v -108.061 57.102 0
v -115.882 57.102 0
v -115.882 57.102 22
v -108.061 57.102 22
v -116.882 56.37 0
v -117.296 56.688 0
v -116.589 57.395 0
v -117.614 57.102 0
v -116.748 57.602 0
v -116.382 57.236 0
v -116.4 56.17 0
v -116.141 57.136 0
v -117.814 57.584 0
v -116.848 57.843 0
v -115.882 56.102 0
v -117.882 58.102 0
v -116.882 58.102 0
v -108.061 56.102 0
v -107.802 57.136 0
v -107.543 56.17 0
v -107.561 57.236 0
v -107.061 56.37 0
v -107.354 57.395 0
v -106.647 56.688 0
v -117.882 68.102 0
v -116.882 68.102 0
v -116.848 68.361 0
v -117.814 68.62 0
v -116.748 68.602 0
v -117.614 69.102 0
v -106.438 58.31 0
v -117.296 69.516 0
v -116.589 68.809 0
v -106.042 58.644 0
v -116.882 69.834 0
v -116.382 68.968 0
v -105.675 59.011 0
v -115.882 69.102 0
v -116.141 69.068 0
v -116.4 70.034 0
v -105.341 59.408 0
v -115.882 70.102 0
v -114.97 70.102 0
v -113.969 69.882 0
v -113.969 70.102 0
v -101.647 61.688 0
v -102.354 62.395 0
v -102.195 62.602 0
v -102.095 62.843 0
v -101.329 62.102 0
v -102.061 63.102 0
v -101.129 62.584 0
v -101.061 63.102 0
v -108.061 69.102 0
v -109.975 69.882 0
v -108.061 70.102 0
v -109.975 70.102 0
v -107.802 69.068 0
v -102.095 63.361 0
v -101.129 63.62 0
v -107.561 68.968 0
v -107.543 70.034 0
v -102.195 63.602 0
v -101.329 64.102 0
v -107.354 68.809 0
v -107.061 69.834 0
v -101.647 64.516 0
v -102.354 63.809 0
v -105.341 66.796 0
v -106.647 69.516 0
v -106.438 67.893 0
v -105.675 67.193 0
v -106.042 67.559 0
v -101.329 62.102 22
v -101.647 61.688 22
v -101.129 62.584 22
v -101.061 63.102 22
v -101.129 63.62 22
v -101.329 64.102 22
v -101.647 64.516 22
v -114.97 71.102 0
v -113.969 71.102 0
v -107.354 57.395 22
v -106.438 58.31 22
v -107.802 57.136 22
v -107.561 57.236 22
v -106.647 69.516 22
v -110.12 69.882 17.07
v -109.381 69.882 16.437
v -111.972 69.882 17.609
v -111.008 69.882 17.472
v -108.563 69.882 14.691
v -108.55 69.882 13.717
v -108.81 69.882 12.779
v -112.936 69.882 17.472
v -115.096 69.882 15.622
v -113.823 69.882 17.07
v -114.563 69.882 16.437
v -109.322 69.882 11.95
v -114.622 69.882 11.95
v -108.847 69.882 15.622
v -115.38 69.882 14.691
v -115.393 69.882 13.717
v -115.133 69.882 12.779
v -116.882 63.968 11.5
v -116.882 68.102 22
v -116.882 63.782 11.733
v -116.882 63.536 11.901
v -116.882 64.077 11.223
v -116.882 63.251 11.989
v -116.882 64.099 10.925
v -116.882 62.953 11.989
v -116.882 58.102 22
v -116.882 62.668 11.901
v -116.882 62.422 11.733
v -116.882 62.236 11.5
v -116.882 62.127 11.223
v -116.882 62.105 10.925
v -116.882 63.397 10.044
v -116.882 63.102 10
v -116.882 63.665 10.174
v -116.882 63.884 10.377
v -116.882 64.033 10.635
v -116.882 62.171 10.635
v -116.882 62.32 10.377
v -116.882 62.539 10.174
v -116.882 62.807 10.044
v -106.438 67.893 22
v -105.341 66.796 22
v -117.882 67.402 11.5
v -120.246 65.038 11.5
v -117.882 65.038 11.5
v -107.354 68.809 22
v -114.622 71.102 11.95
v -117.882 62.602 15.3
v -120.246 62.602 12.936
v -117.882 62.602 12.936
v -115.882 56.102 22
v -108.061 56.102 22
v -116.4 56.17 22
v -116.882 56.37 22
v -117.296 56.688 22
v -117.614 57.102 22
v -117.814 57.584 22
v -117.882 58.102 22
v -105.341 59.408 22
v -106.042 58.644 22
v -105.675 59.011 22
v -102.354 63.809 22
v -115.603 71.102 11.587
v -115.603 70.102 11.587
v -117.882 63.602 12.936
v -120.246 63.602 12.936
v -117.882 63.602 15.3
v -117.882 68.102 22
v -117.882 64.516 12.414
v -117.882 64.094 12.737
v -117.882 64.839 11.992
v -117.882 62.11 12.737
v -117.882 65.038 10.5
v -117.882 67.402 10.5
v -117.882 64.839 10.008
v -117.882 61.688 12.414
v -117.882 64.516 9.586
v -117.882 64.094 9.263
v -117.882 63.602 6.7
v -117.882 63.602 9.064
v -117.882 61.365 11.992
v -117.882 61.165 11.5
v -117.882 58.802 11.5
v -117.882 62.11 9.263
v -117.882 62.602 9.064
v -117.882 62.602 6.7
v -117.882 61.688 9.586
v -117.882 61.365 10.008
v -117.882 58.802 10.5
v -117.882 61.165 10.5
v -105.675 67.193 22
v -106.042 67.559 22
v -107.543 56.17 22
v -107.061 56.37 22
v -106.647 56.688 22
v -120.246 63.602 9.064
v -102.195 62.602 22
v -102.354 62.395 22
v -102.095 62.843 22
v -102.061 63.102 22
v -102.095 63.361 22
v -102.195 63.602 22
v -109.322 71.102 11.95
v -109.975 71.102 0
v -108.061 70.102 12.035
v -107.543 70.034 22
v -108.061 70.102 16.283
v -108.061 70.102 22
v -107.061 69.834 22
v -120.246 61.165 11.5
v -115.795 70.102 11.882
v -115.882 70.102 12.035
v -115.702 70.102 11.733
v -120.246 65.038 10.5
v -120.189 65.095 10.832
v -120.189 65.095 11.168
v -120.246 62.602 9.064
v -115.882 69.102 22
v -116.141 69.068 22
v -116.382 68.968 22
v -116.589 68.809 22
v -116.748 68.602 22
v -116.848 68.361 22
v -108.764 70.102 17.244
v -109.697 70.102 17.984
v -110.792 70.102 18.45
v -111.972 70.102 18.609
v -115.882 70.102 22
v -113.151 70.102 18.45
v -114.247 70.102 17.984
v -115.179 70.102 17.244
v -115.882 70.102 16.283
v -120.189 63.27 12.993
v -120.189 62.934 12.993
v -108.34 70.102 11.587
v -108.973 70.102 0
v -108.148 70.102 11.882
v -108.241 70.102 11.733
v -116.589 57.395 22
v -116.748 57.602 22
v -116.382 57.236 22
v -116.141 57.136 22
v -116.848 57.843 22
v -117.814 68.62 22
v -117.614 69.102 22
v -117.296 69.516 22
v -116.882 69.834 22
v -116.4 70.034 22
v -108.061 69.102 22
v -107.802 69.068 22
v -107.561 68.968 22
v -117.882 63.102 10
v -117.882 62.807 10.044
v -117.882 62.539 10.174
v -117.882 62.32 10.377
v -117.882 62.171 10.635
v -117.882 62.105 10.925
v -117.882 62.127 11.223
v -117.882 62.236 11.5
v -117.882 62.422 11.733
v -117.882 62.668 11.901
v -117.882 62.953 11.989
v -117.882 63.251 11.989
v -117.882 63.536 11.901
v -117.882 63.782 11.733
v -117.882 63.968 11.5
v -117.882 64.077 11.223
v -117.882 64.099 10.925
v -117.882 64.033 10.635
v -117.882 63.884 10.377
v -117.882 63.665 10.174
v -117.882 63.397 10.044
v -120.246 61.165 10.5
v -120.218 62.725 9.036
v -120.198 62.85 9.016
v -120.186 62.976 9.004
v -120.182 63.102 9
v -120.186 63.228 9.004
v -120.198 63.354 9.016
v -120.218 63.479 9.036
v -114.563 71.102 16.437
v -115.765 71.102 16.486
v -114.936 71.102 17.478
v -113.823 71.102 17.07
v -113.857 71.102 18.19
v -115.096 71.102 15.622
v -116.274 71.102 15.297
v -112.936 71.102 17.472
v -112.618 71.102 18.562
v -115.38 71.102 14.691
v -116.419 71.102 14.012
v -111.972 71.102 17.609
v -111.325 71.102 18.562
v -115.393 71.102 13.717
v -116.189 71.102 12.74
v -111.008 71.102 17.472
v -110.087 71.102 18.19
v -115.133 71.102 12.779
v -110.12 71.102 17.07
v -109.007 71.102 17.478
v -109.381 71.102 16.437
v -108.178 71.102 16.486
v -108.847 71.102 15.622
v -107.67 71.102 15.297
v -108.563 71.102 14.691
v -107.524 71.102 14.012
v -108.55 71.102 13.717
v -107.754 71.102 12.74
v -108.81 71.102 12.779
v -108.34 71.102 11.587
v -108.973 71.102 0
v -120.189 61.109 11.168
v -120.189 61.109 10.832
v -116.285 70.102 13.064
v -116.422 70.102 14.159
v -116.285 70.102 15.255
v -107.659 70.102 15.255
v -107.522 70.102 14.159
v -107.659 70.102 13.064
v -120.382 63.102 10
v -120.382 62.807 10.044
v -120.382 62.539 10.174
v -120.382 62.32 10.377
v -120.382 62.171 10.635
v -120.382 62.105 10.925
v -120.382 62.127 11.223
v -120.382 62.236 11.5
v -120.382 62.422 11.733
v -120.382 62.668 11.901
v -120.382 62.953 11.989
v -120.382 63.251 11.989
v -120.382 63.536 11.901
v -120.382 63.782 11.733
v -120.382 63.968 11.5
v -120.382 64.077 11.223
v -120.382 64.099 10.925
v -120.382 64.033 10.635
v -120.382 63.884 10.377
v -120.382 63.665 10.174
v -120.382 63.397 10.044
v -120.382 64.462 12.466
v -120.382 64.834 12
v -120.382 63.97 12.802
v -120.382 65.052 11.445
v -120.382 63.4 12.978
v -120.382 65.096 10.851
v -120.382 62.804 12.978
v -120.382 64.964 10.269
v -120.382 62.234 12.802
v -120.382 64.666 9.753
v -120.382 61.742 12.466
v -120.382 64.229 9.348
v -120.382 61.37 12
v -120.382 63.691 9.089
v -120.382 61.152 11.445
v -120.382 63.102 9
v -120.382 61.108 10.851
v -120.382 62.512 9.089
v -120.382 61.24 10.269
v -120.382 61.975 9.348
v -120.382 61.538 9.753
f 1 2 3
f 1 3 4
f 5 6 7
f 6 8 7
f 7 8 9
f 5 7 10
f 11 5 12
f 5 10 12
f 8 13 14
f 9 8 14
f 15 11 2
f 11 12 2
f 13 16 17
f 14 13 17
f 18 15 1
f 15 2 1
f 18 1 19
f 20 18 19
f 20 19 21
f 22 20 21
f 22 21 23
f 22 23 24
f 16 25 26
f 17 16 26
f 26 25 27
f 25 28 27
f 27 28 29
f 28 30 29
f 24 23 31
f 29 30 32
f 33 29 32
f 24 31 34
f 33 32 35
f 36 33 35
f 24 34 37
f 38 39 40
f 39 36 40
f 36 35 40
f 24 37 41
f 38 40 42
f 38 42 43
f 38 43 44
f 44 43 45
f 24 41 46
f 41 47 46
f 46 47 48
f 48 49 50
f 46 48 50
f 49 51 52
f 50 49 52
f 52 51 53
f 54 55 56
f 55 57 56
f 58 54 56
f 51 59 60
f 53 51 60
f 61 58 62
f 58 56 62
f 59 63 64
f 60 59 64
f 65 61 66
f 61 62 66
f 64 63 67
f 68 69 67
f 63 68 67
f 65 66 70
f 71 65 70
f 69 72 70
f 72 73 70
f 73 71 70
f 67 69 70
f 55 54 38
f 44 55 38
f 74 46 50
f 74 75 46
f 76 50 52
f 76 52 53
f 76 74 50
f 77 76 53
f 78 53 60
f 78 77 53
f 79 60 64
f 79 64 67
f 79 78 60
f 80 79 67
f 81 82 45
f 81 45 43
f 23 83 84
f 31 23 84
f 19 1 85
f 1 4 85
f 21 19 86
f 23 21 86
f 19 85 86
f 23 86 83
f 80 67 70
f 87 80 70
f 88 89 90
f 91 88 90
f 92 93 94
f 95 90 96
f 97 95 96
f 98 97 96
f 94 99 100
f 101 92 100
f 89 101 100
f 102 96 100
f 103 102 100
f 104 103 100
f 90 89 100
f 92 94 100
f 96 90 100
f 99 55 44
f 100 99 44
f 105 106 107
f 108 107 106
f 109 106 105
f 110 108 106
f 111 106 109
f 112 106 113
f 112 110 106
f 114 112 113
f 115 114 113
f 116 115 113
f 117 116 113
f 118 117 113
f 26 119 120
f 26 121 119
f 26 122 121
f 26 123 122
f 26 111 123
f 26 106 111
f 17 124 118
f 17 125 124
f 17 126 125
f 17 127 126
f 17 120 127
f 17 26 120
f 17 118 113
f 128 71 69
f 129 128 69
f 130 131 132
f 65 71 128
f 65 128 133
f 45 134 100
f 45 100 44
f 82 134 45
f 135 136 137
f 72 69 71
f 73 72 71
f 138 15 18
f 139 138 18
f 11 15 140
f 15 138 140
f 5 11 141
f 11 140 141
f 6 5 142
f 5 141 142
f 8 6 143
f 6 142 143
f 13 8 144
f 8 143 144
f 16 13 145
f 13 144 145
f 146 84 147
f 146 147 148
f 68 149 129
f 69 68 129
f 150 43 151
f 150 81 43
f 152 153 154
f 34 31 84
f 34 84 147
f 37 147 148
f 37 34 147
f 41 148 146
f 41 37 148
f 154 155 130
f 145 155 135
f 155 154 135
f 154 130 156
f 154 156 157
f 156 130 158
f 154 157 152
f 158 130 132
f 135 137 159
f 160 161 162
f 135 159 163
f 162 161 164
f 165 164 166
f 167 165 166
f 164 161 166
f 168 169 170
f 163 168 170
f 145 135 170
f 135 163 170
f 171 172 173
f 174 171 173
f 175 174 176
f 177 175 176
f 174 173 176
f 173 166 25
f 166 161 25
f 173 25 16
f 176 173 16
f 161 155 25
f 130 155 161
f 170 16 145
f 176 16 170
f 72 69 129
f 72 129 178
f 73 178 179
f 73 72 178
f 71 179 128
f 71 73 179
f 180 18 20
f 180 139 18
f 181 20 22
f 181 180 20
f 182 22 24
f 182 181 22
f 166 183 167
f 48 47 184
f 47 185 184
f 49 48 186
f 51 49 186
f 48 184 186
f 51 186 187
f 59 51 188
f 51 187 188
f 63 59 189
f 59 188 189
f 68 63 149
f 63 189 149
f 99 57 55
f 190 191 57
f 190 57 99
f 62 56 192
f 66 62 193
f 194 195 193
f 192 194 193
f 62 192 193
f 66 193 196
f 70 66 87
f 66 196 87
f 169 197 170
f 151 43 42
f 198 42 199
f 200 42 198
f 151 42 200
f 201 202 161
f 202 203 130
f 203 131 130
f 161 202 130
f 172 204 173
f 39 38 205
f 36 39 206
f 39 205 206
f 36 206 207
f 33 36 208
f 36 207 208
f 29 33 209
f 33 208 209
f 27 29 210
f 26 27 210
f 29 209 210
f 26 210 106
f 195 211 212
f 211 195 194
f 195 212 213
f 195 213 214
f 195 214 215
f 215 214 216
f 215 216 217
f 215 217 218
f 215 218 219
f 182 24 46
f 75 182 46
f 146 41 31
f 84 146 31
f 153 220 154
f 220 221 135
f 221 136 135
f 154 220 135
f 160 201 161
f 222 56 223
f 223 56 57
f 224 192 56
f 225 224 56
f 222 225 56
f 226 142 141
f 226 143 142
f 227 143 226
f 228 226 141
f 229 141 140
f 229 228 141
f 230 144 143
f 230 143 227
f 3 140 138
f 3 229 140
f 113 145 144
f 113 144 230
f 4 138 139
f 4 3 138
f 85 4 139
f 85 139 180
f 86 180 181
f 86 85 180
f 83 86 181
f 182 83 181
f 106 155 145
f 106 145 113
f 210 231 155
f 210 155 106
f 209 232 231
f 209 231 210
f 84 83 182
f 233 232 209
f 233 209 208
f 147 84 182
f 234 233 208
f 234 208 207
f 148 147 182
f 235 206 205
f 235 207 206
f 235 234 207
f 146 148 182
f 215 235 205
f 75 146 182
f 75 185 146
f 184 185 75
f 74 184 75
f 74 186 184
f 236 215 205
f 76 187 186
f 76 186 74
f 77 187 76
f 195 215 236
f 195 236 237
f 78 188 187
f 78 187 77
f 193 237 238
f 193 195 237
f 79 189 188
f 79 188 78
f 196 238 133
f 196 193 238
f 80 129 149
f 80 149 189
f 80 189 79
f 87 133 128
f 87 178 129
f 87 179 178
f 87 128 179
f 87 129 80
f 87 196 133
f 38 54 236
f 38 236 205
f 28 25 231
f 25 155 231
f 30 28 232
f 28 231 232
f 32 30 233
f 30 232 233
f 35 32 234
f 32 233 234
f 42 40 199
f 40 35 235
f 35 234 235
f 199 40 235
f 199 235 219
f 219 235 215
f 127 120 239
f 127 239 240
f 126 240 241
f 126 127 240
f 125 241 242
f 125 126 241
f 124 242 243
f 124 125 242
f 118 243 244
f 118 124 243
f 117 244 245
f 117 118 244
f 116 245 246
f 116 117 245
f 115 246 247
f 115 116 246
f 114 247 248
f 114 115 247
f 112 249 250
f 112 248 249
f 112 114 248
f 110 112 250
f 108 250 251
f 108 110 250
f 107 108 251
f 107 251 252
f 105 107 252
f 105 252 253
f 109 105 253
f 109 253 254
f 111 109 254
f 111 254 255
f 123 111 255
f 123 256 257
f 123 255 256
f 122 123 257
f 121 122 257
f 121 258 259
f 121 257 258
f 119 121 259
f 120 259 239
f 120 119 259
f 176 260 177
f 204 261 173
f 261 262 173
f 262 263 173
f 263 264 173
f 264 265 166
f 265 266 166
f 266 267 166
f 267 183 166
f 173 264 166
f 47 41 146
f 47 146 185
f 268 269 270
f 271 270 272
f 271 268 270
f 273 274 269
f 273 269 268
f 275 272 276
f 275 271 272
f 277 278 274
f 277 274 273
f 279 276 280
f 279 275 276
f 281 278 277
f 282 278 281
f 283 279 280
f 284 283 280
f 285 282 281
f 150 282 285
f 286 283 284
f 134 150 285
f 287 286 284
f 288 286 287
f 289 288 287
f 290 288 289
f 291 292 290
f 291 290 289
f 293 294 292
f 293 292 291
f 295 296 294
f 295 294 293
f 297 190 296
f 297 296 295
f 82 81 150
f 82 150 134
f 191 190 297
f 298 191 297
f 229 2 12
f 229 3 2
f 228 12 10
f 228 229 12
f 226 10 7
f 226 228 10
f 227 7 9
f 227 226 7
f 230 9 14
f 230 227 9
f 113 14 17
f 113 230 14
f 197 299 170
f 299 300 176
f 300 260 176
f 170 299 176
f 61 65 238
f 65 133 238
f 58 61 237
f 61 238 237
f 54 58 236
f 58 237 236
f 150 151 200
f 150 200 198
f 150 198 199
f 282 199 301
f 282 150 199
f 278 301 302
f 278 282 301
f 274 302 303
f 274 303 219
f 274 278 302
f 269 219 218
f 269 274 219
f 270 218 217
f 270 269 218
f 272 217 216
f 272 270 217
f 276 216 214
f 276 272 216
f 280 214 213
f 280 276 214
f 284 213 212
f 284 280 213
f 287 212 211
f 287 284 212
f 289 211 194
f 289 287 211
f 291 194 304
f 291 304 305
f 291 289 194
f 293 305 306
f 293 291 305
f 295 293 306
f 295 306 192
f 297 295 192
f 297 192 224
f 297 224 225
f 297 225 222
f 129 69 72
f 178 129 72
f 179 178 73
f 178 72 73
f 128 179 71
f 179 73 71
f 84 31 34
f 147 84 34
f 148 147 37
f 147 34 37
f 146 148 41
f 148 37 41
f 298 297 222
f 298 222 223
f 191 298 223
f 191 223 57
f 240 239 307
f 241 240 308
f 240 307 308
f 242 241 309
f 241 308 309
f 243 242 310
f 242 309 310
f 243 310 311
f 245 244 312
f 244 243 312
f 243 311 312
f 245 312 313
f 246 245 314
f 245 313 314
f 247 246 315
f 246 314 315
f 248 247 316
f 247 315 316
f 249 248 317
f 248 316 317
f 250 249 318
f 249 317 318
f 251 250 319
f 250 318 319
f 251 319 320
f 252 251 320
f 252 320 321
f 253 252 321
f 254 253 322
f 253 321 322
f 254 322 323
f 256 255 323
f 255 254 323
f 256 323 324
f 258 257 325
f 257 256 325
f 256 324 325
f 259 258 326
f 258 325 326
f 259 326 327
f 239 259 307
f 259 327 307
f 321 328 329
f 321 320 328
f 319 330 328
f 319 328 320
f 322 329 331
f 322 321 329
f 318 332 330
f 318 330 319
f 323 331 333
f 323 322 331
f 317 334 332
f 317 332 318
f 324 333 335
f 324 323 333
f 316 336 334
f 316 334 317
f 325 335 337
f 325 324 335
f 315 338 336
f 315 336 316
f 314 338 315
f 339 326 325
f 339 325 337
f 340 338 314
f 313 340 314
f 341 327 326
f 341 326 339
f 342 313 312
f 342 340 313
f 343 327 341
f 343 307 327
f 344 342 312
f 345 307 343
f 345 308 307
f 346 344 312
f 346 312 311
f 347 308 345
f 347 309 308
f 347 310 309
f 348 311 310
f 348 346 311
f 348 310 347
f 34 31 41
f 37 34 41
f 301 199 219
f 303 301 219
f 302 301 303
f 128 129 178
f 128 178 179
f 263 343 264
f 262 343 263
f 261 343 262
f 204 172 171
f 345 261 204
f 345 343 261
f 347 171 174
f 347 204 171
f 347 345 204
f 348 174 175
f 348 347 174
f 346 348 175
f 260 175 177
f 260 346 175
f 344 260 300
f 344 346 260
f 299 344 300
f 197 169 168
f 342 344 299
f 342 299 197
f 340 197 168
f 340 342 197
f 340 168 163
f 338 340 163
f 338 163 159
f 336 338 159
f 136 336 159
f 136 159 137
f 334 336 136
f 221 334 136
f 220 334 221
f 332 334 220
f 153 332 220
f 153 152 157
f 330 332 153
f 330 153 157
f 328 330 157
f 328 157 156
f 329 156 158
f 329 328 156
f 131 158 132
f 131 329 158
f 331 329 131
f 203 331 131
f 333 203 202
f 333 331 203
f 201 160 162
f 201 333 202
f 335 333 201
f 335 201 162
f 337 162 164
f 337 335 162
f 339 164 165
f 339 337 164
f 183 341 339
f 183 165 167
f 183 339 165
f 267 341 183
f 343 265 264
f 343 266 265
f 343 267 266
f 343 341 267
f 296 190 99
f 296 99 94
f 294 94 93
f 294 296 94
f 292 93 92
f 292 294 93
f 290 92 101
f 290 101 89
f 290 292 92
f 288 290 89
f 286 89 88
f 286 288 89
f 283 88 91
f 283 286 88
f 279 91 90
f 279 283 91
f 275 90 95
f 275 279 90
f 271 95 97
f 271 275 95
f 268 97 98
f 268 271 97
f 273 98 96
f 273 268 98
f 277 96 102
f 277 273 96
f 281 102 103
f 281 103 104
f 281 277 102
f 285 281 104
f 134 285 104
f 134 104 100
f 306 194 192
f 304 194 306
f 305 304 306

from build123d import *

# Parameters (mm, degrees)
BOSS_EXTRU_1_DEPTH           = 22
CONG_1_R                     = 1
CONG_2_R                     = 2
ENL_V_MAT_EXTRU_2_DEPTH      = 3
ENL_V_MAT_EXTRU_2_DEPTH_BACK = 2
ESQUISSE3_R                  = 1
ENL_V_MAT_EXTRU_5_DEPTH      = 0.22
BOSS_EXTRU_3_START           = 2.5
ESQUISSE8_R                  = 2
ESQUISSE8_R_2                = 1
BOSS_EXTRU_3_DEPTH           = 2.5
NERVURE2_REACH               = 124.576
ESQUISSE13_WALL_W            = 250.687529102
ESQUISSE13_WALL_H            = 1
R_P_TITION_CIRCULAIRE1_COUNT = 4
BOSS_EXTRU_6_START           = 1
BOSS_EXTRU_6_DEPTH           = 1
FRACTIONNER1_DEPTH           = 22
FRACTIONNER1_2_DEPTH         = 22
FRACTIONNER1_3_DEPTH         = 22


# Read off the part's stored shape, not the designer's step: Fractionner1
with BuildPart() as part:
    # Esquisse1 → Boss.-Extru.1 (new body)
    with BuildSketch(Plane.XY):
        Polygon((-117.882204612, 56.101961411), (-107.232709675, 56.101961411), (-100.232709675, 63.101961411), (-107.232709675, 70.101961411), (-117.882204612, 70.101961411), align=None)
        Polygon((-116.882204612, 57.101961411), (-107.646923238, 57.101961411), (-101.646923238, 63.101961411), (-107.646923238, 69.101961411), (-116.882204612, 69.101961411), align=None, mode=Mode.SUBTRACT)
    extrude(amount=BOSS_EXTRU_1_DEPTH)

    # Congé1
    cong_1_edges = [part.edges().sort_by_distance(p)[0] for p in [
        (-116.882204612, 69.101961411, 11),
        (-116.882204612, 57.101961411, 11),
        (-107.646923238, 57.101961411, 11),
        (-101.646923238, 63.101961411, 11),
        (-107.646923238, 69.101961411, 11),
    ]]
    fillet(cong_1_edges, radius=CONG_1_R)

    # Congé2
    cong_2_edges = [part.edges().sort_by_distance(p)[0] for p in [
        (-117.882204612, 70.101961411, 11),
        (-107.232709675, 70.101961411, 11),
        (-100.232709675, 63.101961411, 11),
        (-107.232709675, 56.101961411, 11),
        (-117.882204612, 56.101961411, 11),
    ]]
    fillet(cong_2_edges, radius=CONG_2_R)

    # Esquisse3 → Enlèv. mat.-Extru.2 (cut, two sides: drawn at the far end of the back side and taken through both)
    with BuildSketch(Plane.ZY.offset(117.882204612).offset(-ENL_V_MAT_EXTRU_2_DEPTH_BACK)):
        with Locations(Location((11, 63.101961411, 0), (0, 0, 180))):
            Circle(ESQUISSE3_R)
    extrude(amount=ENL_V_MAT_EXTRU_2_DEPTH + ENL_V_MAT_EXTRU_2_DEPTH_BACK, mode=Mode.SUBTRACT)

    # Esquisse6 → Enlèv. mat.-Extru.5 (cut)
    with BuildSketch(Plane(origin=(0, 70.101961411, 0), x_dir=(1, 0, 0), z_dir=(0, 1, 0))):
        with BuildLine():
            Line((-109.974649826, 0), (-109.321670706, -11.950049764))
            ThreePointArc((-109.321670706, -11.950049764), (-111.971670706, -17.609121967), (-114.621670706, -11.950049764))
            Line((-114.621670706, -11.950049764), (-113.968691586, 0))
            Line((-113.968691586, 0), (-109.974649826, 0))
        make_face()
    extrude(amount=-ENL_V_MAT_EXTRU_5_DEPTH, mode=Mode.SUBTRACT)

    # Esquisse8 → Boss.-Extru.3 (add)
    with BuildSketch(Plane.ZY.offset(117.882204612).offset(BOSS_EXTRU_3_START)):
        with Locations(Location((11, 63.101961411, 0), (0, 0, 180))):
            Circle(ESQUISSE8_R)
        with Locations(Location((11, 63.101961411, 0), (0, 0, 180))):
            Circle(ESQUISSE8_R_2, mode=Mode.SUBTRACT)
    extrude(amount=-BOSS_EXTRU_3_DEPTH)

    # Esquisse13 wall → Nervure2 (add, up to next)
    with BuildSketch(Plane(origin=(-119.132204612, 63.101961411, 14.05), x_dir=(0.707106781187, 0, 0.707106781187), z_dir=(0.707106781187, 0, -0.707106781187)), mode=Mode.PRIVATE) as nervure2_sk1:
        Rectangle(ESQUISSE13_WALL_W, ESQUISSE13_WALL_H)
    nervure2_tool1 = extrude(nervure2_sk1.sketch, amount=NERVURE2_REACH, mode=Mode.PRIVATE) - part.part
    nervure2 = nervure2_tool1.solids().sort_by_distance((-119.132204612, 63.101961411, 14.05))[0]
    add(nervure2)

    # Répétition circulaire1: Nervure2 ×4 about axis
    r_p_tition_circulaire1_axis = Axis((0, 63.101961411, 11), (1, 0, 0))
    for i in range(1, R_P_TITION_CIRCULAIRE1_COUNT):
        add(nervure2.rotate(r_p_tition_circulaire1_axis, i * 360 / R_P_TITION_CIRCULAIRE1_COUNT))

    # Esquisse17 → Boss.-Extru.6 (add)
    with BuildSketch(Plane(origin=(0, 70.101961411, 0), x_dir=(1, 0, 0), z_dir=(0, 1, 0)).offset(BOSS_EXTRU_6_START)):
        with BuildLine():
            Line((-113.968691586, 0), (-114.970174136, 0.000168947))
            Line((-114.970174136, 0.000168947), (-115.603350156, -11.587467952))
            ThreePointArc((-115.603350156, -11.587467952), (-111.971670706, -18.609121967), (-108.339991256, -11.587467952))
            Line((-108.339991256, -11.587467952), (-108.973157096, -1.7339e-05))
            Line((-108.973157096, -1.7339e-05), (-109.974649826, 0))
            Line((-109.974649826, 0), (-109.321670706, -11.950049764))
            ThreePointArc((-109.321670706, -11.950049764), (-111.971670706, -17.609121967), (-114.621670706, -11.950049764))
            Line((-114.621670706, -11.950049764), (-113.968691586, 0))
        make_face()
    extrude(amount=-BOSS_EXTRU_6_DEPTH)

    # Fractionner1 3 outline → Fractionner1 3 (cut)
    with BuildSketch(Plane.XY):
        with BuildLine():
            ThreePointArc((-106.438426385, 58.310458264), (-105.854208586, 58.823965385), (-105.340701465, 59.408183184))
            Line((-105.340701465, 59.408183184), (-106.438426385, 58.310458264))
        make_face()
        with BuildLine():
            ThreePointArc((-105.340701465, 66.795739638), (-105.854208586, 67.379957437), (-106.438426385, 67.893464558))
            Line((-106.438426385, 67.893464558), (-105.340701465, 66.795739638))
        make_face()
    extrude(amount=FRACTIONNER1_3_DEPTH, mode=Mode.SUBTRACT)


with BuildPart() as body_2:
    # Fractionner1 outline → Fractionner1 (new body)
    with BuildSketch(Plane.XY):
        with BuildLine():
            ThreePointArc((-106.438426385, 58.310458264), (-105.854208586, 58.823965385), (-105.340701465, 59.408183184))
            Line((-105.340701465, 59.408183184), (-106.438426385, 58.310458264))
        make_face()
    extrude(amount=FRACTIONNER1_DEPTH)


with BuildPart() as body_3:
    # Fractionner1 2 outline → Fractionner1 2 (new body)
    with BuildSketch(Plane.XY):
        with BuildLine():
            ThreePointArc((-105.340701465, 66.795739638), (-105.854208586, 67.379957437), (-106.438426385, 67.893464558))
            Line((-106.438426385, 67.893464558), (-105.340701465, 66.795739638))
        make_face()
    extrude(amount=FRACTIONNER1_2_DEPTH)


solid = Compound([part.part, body_2.part, body_3.part])
